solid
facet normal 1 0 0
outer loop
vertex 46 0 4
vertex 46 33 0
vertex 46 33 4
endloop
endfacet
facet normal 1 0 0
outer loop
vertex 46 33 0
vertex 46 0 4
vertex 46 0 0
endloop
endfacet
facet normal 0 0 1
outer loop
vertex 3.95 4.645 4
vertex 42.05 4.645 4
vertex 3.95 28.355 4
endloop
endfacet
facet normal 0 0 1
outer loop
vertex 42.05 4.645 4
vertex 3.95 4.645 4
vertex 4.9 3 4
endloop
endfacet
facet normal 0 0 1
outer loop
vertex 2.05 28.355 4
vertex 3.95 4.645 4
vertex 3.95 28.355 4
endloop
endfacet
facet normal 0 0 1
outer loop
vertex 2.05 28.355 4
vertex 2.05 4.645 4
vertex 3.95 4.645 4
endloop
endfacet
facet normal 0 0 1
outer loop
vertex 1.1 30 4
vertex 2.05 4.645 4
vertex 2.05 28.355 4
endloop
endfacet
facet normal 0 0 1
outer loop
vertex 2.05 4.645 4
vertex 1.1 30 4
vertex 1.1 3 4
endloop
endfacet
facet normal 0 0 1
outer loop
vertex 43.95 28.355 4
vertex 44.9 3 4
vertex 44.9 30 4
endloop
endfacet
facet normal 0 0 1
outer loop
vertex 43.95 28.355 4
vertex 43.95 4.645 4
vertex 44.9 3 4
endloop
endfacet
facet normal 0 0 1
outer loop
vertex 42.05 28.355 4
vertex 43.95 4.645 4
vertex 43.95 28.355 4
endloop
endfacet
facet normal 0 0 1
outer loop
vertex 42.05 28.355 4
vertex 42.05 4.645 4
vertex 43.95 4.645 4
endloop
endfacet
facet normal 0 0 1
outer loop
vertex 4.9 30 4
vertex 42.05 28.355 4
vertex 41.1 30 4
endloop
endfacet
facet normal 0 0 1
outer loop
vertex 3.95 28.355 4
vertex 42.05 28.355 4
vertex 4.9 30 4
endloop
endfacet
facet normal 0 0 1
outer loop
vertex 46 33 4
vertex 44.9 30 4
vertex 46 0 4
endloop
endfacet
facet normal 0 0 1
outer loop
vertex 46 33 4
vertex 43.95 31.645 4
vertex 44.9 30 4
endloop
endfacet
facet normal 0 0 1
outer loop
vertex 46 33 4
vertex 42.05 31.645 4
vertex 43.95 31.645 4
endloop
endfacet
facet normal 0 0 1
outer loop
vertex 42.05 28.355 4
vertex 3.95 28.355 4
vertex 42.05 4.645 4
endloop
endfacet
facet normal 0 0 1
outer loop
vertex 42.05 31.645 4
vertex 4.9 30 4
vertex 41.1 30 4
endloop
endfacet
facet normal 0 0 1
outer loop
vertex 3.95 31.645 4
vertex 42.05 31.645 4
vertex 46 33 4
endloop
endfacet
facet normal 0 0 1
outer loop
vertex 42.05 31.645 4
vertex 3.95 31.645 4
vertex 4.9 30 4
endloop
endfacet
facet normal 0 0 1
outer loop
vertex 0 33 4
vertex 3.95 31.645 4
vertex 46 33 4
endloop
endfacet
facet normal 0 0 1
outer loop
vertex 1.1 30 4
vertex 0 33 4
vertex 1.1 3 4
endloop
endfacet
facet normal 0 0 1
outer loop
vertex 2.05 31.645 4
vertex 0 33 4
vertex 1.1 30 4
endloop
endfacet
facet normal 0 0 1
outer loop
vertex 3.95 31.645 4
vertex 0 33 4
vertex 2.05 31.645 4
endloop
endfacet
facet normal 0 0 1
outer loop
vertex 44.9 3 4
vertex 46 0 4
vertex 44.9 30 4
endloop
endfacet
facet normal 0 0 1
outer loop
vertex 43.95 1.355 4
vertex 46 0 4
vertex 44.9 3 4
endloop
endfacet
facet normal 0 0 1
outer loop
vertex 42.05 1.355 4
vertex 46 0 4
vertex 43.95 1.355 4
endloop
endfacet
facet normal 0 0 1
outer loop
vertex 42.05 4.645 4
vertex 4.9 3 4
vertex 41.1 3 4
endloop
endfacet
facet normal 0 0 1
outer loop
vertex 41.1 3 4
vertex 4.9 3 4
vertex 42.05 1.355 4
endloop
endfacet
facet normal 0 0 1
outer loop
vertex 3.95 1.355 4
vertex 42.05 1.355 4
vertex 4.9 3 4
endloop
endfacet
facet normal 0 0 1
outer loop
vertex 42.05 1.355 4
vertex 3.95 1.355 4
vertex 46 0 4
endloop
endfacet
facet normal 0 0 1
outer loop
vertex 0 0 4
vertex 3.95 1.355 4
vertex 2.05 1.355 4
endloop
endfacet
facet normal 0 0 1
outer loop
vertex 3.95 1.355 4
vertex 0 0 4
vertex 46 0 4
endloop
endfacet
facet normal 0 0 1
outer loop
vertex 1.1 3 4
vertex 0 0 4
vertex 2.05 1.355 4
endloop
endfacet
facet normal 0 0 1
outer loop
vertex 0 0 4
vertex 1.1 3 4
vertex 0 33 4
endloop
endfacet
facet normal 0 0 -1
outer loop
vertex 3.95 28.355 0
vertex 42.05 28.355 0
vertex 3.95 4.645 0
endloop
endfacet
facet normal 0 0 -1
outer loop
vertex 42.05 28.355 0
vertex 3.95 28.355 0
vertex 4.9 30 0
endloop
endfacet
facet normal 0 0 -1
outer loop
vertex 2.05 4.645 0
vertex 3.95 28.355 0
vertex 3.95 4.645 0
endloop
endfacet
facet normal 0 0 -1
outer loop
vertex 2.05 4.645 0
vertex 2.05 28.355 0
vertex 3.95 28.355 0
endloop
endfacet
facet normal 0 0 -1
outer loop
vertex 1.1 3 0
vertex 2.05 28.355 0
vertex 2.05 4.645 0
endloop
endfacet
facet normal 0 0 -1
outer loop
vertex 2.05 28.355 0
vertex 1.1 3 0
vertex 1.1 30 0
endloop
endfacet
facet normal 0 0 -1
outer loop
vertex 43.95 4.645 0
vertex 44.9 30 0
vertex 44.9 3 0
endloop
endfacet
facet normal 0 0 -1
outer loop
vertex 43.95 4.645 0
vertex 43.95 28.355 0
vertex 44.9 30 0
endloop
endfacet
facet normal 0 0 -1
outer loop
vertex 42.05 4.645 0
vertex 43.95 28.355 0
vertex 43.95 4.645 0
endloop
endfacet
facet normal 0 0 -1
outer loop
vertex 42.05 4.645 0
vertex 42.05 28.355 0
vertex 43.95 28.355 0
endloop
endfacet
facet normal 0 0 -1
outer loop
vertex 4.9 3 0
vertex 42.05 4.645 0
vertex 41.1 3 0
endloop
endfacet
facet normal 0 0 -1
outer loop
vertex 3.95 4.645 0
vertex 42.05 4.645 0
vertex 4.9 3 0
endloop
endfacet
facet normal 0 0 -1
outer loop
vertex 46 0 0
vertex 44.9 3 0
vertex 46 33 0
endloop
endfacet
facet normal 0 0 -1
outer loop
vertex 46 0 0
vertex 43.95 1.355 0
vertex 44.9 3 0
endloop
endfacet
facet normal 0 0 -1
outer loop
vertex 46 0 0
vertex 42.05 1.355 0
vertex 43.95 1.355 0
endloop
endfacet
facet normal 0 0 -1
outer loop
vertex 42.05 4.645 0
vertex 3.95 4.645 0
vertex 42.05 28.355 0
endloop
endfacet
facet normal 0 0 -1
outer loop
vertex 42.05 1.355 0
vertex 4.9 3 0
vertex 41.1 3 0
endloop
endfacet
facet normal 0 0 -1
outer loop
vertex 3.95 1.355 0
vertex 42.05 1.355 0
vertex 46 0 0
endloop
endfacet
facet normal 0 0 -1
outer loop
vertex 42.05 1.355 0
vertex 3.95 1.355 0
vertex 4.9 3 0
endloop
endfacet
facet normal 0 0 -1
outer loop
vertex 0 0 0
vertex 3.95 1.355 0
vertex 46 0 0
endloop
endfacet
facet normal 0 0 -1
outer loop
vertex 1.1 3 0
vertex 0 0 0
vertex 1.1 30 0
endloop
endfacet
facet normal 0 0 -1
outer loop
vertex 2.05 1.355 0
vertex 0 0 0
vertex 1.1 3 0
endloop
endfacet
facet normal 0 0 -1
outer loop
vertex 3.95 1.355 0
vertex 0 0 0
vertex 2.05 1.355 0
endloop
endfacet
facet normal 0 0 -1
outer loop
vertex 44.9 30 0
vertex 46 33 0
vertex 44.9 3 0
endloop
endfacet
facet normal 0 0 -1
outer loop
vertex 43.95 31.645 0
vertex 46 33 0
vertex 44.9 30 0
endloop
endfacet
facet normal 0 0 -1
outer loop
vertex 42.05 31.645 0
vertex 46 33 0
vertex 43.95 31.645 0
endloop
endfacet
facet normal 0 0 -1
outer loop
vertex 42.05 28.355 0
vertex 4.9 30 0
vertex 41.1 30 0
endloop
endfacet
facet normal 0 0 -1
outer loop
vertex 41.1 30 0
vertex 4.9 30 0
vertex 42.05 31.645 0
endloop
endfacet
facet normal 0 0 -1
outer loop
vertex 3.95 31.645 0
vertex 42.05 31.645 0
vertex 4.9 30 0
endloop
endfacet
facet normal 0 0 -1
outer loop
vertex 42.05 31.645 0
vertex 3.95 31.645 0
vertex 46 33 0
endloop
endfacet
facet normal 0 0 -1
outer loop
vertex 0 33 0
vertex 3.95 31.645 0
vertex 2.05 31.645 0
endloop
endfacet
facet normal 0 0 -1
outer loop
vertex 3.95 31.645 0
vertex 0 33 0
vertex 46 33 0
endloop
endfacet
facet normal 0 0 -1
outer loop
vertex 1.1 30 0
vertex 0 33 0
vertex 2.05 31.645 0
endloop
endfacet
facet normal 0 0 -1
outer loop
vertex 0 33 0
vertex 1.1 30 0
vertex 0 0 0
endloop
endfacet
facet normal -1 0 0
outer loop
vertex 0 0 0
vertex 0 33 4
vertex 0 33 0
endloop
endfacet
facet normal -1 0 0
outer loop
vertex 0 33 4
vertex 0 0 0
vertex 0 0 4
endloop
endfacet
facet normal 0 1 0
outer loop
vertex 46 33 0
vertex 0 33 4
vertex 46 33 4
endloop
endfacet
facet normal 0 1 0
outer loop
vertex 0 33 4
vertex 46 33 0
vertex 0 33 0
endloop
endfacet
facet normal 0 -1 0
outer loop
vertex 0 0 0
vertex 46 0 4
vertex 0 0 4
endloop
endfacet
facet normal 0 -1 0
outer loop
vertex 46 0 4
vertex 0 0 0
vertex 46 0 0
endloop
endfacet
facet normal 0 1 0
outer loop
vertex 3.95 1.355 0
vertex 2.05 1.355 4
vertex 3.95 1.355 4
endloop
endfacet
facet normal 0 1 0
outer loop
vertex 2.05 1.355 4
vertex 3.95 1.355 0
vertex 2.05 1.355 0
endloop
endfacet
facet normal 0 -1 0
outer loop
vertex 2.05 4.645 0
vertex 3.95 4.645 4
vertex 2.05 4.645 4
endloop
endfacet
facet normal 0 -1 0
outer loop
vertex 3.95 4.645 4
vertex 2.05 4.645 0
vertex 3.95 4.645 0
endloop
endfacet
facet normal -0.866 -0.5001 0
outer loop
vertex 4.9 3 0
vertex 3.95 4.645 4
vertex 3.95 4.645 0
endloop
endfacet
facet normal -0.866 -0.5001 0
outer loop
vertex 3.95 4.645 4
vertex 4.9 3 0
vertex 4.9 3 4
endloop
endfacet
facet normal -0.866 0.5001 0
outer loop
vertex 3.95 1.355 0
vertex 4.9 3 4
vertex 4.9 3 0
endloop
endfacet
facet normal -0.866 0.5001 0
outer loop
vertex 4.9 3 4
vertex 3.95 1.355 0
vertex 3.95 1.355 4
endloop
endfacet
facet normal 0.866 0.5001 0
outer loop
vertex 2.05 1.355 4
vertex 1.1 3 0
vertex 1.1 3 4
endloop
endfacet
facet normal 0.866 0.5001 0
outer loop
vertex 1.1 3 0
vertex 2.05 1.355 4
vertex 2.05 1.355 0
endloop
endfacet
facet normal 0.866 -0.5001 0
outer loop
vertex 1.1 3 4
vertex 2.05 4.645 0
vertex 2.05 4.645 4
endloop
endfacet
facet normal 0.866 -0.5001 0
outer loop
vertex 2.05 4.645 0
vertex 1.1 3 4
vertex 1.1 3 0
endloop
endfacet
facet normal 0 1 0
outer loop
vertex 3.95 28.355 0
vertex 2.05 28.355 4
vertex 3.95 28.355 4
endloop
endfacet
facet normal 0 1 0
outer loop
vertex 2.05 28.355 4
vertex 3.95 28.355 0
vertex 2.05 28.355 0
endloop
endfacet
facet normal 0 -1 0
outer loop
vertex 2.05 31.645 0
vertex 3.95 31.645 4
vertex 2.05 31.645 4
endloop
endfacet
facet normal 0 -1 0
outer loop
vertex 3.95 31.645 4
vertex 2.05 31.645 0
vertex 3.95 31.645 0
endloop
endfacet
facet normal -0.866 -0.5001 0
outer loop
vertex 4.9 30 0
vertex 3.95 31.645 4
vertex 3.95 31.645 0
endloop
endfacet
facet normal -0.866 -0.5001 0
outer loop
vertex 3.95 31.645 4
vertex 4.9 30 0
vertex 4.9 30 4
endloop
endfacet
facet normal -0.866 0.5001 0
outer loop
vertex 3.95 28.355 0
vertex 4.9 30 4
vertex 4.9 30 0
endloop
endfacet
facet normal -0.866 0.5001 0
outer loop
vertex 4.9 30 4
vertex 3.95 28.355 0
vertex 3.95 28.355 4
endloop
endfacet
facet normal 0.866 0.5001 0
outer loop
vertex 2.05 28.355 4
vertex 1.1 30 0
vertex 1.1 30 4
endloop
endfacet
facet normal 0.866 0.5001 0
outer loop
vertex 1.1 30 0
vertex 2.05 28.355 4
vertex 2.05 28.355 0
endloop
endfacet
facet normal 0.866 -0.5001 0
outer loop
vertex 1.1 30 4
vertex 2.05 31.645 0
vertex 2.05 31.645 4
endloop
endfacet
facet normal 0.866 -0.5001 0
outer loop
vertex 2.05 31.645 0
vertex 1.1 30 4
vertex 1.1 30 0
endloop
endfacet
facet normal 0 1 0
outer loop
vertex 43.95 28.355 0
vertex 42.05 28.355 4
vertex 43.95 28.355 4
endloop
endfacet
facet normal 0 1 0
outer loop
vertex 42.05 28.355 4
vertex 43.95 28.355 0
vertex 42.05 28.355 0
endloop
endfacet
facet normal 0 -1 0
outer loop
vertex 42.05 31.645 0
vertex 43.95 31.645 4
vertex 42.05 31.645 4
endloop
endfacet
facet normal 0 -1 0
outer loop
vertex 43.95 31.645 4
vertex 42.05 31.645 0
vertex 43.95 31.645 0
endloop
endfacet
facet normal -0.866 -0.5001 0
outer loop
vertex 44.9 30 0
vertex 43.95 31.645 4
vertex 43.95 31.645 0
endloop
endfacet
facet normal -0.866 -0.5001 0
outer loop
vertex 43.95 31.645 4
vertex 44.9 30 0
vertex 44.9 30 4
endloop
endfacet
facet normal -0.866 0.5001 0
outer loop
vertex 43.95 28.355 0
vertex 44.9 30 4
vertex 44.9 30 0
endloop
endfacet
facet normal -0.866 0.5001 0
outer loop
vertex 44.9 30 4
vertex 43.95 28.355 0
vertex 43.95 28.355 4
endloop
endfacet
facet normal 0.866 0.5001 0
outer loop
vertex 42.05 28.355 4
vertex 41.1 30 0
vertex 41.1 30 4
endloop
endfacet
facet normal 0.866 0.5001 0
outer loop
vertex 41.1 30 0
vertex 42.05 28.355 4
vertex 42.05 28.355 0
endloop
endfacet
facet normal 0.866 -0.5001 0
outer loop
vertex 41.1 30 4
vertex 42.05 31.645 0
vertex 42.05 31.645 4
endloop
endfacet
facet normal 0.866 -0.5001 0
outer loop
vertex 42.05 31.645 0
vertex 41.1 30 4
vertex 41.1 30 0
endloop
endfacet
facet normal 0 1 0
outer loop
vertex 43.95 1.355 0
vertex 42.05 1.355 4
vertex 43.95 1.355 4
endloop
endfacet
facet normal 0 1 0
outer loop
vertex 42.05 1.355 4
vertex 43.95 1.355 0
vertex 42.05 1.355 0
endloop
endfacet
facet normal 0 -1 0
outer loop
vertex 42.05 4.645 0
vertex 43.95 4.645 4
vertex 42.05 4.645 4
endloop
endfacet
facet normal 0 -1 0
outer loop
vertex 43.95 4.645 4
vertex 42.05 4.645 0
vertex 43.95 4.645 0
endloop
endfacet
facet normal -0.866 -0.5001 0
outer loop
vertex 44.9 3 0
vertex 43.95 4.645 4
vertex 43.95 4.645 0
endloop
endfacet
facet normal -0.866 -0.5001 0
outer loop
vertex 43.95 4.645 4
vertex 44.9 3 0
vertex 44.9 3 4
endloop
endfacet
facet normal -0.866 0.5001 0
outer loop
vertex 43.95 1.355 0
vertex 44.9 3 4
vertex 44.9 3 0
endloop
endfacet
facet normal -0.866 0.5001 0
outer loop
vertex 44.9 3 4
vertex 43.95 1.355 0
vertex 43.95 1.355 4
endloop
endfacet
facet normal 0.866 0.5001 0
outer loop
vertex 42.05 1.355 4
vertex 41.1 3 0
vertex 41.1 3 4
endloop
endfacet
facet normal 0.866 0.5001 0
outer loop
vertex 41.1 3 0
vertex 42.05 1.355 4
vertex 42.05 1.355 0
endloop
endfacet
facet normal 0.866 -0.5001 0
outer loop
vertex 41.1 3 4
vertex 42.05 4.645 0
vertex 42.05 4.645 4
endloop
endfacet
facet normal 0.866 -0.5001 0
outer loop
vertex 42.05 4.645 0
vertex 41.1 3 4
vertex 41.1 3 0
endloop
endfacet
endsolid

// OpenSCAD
smallnum = 0.05;
bignum = 10;
icanvasx= 42;
icanvasy = 24;
ocanvasx= 43.11;
ocanvasy = 25.06;

boardheight = 1.5;
holderx=46;
holdery=33;
holderz=4;


difference(){
    cube([holderx,holdery,holderz]);
    translate([ocanvasx-icanvasx+2, (holdery-icanvasy)/2, -smallnum]) linear_extrude(height = bignum)
        import (file = "IMU-InsetDXF.dxf"); 
    translate([2, (holdery-ocanvasy)/2, holderz-boardheight-smallnum]) linear_extrude(height = bignum)import (file = "IMU-Outset2DXF.dxf");
       
    
    translate([3,3,0]) cylinder(r=1.9,h=bignum, center=true);
    translate([3,holdery-3,0]) cylinder(r=1.9,h=bignum, center=true);
    translate([holderx-3,holdery-3,0]) cylinder(r=1.9,h=bignum, center=true);
    translate([holderx-3,3,0]) cylinder(r=1.9,h=bignum, center=true);
}
